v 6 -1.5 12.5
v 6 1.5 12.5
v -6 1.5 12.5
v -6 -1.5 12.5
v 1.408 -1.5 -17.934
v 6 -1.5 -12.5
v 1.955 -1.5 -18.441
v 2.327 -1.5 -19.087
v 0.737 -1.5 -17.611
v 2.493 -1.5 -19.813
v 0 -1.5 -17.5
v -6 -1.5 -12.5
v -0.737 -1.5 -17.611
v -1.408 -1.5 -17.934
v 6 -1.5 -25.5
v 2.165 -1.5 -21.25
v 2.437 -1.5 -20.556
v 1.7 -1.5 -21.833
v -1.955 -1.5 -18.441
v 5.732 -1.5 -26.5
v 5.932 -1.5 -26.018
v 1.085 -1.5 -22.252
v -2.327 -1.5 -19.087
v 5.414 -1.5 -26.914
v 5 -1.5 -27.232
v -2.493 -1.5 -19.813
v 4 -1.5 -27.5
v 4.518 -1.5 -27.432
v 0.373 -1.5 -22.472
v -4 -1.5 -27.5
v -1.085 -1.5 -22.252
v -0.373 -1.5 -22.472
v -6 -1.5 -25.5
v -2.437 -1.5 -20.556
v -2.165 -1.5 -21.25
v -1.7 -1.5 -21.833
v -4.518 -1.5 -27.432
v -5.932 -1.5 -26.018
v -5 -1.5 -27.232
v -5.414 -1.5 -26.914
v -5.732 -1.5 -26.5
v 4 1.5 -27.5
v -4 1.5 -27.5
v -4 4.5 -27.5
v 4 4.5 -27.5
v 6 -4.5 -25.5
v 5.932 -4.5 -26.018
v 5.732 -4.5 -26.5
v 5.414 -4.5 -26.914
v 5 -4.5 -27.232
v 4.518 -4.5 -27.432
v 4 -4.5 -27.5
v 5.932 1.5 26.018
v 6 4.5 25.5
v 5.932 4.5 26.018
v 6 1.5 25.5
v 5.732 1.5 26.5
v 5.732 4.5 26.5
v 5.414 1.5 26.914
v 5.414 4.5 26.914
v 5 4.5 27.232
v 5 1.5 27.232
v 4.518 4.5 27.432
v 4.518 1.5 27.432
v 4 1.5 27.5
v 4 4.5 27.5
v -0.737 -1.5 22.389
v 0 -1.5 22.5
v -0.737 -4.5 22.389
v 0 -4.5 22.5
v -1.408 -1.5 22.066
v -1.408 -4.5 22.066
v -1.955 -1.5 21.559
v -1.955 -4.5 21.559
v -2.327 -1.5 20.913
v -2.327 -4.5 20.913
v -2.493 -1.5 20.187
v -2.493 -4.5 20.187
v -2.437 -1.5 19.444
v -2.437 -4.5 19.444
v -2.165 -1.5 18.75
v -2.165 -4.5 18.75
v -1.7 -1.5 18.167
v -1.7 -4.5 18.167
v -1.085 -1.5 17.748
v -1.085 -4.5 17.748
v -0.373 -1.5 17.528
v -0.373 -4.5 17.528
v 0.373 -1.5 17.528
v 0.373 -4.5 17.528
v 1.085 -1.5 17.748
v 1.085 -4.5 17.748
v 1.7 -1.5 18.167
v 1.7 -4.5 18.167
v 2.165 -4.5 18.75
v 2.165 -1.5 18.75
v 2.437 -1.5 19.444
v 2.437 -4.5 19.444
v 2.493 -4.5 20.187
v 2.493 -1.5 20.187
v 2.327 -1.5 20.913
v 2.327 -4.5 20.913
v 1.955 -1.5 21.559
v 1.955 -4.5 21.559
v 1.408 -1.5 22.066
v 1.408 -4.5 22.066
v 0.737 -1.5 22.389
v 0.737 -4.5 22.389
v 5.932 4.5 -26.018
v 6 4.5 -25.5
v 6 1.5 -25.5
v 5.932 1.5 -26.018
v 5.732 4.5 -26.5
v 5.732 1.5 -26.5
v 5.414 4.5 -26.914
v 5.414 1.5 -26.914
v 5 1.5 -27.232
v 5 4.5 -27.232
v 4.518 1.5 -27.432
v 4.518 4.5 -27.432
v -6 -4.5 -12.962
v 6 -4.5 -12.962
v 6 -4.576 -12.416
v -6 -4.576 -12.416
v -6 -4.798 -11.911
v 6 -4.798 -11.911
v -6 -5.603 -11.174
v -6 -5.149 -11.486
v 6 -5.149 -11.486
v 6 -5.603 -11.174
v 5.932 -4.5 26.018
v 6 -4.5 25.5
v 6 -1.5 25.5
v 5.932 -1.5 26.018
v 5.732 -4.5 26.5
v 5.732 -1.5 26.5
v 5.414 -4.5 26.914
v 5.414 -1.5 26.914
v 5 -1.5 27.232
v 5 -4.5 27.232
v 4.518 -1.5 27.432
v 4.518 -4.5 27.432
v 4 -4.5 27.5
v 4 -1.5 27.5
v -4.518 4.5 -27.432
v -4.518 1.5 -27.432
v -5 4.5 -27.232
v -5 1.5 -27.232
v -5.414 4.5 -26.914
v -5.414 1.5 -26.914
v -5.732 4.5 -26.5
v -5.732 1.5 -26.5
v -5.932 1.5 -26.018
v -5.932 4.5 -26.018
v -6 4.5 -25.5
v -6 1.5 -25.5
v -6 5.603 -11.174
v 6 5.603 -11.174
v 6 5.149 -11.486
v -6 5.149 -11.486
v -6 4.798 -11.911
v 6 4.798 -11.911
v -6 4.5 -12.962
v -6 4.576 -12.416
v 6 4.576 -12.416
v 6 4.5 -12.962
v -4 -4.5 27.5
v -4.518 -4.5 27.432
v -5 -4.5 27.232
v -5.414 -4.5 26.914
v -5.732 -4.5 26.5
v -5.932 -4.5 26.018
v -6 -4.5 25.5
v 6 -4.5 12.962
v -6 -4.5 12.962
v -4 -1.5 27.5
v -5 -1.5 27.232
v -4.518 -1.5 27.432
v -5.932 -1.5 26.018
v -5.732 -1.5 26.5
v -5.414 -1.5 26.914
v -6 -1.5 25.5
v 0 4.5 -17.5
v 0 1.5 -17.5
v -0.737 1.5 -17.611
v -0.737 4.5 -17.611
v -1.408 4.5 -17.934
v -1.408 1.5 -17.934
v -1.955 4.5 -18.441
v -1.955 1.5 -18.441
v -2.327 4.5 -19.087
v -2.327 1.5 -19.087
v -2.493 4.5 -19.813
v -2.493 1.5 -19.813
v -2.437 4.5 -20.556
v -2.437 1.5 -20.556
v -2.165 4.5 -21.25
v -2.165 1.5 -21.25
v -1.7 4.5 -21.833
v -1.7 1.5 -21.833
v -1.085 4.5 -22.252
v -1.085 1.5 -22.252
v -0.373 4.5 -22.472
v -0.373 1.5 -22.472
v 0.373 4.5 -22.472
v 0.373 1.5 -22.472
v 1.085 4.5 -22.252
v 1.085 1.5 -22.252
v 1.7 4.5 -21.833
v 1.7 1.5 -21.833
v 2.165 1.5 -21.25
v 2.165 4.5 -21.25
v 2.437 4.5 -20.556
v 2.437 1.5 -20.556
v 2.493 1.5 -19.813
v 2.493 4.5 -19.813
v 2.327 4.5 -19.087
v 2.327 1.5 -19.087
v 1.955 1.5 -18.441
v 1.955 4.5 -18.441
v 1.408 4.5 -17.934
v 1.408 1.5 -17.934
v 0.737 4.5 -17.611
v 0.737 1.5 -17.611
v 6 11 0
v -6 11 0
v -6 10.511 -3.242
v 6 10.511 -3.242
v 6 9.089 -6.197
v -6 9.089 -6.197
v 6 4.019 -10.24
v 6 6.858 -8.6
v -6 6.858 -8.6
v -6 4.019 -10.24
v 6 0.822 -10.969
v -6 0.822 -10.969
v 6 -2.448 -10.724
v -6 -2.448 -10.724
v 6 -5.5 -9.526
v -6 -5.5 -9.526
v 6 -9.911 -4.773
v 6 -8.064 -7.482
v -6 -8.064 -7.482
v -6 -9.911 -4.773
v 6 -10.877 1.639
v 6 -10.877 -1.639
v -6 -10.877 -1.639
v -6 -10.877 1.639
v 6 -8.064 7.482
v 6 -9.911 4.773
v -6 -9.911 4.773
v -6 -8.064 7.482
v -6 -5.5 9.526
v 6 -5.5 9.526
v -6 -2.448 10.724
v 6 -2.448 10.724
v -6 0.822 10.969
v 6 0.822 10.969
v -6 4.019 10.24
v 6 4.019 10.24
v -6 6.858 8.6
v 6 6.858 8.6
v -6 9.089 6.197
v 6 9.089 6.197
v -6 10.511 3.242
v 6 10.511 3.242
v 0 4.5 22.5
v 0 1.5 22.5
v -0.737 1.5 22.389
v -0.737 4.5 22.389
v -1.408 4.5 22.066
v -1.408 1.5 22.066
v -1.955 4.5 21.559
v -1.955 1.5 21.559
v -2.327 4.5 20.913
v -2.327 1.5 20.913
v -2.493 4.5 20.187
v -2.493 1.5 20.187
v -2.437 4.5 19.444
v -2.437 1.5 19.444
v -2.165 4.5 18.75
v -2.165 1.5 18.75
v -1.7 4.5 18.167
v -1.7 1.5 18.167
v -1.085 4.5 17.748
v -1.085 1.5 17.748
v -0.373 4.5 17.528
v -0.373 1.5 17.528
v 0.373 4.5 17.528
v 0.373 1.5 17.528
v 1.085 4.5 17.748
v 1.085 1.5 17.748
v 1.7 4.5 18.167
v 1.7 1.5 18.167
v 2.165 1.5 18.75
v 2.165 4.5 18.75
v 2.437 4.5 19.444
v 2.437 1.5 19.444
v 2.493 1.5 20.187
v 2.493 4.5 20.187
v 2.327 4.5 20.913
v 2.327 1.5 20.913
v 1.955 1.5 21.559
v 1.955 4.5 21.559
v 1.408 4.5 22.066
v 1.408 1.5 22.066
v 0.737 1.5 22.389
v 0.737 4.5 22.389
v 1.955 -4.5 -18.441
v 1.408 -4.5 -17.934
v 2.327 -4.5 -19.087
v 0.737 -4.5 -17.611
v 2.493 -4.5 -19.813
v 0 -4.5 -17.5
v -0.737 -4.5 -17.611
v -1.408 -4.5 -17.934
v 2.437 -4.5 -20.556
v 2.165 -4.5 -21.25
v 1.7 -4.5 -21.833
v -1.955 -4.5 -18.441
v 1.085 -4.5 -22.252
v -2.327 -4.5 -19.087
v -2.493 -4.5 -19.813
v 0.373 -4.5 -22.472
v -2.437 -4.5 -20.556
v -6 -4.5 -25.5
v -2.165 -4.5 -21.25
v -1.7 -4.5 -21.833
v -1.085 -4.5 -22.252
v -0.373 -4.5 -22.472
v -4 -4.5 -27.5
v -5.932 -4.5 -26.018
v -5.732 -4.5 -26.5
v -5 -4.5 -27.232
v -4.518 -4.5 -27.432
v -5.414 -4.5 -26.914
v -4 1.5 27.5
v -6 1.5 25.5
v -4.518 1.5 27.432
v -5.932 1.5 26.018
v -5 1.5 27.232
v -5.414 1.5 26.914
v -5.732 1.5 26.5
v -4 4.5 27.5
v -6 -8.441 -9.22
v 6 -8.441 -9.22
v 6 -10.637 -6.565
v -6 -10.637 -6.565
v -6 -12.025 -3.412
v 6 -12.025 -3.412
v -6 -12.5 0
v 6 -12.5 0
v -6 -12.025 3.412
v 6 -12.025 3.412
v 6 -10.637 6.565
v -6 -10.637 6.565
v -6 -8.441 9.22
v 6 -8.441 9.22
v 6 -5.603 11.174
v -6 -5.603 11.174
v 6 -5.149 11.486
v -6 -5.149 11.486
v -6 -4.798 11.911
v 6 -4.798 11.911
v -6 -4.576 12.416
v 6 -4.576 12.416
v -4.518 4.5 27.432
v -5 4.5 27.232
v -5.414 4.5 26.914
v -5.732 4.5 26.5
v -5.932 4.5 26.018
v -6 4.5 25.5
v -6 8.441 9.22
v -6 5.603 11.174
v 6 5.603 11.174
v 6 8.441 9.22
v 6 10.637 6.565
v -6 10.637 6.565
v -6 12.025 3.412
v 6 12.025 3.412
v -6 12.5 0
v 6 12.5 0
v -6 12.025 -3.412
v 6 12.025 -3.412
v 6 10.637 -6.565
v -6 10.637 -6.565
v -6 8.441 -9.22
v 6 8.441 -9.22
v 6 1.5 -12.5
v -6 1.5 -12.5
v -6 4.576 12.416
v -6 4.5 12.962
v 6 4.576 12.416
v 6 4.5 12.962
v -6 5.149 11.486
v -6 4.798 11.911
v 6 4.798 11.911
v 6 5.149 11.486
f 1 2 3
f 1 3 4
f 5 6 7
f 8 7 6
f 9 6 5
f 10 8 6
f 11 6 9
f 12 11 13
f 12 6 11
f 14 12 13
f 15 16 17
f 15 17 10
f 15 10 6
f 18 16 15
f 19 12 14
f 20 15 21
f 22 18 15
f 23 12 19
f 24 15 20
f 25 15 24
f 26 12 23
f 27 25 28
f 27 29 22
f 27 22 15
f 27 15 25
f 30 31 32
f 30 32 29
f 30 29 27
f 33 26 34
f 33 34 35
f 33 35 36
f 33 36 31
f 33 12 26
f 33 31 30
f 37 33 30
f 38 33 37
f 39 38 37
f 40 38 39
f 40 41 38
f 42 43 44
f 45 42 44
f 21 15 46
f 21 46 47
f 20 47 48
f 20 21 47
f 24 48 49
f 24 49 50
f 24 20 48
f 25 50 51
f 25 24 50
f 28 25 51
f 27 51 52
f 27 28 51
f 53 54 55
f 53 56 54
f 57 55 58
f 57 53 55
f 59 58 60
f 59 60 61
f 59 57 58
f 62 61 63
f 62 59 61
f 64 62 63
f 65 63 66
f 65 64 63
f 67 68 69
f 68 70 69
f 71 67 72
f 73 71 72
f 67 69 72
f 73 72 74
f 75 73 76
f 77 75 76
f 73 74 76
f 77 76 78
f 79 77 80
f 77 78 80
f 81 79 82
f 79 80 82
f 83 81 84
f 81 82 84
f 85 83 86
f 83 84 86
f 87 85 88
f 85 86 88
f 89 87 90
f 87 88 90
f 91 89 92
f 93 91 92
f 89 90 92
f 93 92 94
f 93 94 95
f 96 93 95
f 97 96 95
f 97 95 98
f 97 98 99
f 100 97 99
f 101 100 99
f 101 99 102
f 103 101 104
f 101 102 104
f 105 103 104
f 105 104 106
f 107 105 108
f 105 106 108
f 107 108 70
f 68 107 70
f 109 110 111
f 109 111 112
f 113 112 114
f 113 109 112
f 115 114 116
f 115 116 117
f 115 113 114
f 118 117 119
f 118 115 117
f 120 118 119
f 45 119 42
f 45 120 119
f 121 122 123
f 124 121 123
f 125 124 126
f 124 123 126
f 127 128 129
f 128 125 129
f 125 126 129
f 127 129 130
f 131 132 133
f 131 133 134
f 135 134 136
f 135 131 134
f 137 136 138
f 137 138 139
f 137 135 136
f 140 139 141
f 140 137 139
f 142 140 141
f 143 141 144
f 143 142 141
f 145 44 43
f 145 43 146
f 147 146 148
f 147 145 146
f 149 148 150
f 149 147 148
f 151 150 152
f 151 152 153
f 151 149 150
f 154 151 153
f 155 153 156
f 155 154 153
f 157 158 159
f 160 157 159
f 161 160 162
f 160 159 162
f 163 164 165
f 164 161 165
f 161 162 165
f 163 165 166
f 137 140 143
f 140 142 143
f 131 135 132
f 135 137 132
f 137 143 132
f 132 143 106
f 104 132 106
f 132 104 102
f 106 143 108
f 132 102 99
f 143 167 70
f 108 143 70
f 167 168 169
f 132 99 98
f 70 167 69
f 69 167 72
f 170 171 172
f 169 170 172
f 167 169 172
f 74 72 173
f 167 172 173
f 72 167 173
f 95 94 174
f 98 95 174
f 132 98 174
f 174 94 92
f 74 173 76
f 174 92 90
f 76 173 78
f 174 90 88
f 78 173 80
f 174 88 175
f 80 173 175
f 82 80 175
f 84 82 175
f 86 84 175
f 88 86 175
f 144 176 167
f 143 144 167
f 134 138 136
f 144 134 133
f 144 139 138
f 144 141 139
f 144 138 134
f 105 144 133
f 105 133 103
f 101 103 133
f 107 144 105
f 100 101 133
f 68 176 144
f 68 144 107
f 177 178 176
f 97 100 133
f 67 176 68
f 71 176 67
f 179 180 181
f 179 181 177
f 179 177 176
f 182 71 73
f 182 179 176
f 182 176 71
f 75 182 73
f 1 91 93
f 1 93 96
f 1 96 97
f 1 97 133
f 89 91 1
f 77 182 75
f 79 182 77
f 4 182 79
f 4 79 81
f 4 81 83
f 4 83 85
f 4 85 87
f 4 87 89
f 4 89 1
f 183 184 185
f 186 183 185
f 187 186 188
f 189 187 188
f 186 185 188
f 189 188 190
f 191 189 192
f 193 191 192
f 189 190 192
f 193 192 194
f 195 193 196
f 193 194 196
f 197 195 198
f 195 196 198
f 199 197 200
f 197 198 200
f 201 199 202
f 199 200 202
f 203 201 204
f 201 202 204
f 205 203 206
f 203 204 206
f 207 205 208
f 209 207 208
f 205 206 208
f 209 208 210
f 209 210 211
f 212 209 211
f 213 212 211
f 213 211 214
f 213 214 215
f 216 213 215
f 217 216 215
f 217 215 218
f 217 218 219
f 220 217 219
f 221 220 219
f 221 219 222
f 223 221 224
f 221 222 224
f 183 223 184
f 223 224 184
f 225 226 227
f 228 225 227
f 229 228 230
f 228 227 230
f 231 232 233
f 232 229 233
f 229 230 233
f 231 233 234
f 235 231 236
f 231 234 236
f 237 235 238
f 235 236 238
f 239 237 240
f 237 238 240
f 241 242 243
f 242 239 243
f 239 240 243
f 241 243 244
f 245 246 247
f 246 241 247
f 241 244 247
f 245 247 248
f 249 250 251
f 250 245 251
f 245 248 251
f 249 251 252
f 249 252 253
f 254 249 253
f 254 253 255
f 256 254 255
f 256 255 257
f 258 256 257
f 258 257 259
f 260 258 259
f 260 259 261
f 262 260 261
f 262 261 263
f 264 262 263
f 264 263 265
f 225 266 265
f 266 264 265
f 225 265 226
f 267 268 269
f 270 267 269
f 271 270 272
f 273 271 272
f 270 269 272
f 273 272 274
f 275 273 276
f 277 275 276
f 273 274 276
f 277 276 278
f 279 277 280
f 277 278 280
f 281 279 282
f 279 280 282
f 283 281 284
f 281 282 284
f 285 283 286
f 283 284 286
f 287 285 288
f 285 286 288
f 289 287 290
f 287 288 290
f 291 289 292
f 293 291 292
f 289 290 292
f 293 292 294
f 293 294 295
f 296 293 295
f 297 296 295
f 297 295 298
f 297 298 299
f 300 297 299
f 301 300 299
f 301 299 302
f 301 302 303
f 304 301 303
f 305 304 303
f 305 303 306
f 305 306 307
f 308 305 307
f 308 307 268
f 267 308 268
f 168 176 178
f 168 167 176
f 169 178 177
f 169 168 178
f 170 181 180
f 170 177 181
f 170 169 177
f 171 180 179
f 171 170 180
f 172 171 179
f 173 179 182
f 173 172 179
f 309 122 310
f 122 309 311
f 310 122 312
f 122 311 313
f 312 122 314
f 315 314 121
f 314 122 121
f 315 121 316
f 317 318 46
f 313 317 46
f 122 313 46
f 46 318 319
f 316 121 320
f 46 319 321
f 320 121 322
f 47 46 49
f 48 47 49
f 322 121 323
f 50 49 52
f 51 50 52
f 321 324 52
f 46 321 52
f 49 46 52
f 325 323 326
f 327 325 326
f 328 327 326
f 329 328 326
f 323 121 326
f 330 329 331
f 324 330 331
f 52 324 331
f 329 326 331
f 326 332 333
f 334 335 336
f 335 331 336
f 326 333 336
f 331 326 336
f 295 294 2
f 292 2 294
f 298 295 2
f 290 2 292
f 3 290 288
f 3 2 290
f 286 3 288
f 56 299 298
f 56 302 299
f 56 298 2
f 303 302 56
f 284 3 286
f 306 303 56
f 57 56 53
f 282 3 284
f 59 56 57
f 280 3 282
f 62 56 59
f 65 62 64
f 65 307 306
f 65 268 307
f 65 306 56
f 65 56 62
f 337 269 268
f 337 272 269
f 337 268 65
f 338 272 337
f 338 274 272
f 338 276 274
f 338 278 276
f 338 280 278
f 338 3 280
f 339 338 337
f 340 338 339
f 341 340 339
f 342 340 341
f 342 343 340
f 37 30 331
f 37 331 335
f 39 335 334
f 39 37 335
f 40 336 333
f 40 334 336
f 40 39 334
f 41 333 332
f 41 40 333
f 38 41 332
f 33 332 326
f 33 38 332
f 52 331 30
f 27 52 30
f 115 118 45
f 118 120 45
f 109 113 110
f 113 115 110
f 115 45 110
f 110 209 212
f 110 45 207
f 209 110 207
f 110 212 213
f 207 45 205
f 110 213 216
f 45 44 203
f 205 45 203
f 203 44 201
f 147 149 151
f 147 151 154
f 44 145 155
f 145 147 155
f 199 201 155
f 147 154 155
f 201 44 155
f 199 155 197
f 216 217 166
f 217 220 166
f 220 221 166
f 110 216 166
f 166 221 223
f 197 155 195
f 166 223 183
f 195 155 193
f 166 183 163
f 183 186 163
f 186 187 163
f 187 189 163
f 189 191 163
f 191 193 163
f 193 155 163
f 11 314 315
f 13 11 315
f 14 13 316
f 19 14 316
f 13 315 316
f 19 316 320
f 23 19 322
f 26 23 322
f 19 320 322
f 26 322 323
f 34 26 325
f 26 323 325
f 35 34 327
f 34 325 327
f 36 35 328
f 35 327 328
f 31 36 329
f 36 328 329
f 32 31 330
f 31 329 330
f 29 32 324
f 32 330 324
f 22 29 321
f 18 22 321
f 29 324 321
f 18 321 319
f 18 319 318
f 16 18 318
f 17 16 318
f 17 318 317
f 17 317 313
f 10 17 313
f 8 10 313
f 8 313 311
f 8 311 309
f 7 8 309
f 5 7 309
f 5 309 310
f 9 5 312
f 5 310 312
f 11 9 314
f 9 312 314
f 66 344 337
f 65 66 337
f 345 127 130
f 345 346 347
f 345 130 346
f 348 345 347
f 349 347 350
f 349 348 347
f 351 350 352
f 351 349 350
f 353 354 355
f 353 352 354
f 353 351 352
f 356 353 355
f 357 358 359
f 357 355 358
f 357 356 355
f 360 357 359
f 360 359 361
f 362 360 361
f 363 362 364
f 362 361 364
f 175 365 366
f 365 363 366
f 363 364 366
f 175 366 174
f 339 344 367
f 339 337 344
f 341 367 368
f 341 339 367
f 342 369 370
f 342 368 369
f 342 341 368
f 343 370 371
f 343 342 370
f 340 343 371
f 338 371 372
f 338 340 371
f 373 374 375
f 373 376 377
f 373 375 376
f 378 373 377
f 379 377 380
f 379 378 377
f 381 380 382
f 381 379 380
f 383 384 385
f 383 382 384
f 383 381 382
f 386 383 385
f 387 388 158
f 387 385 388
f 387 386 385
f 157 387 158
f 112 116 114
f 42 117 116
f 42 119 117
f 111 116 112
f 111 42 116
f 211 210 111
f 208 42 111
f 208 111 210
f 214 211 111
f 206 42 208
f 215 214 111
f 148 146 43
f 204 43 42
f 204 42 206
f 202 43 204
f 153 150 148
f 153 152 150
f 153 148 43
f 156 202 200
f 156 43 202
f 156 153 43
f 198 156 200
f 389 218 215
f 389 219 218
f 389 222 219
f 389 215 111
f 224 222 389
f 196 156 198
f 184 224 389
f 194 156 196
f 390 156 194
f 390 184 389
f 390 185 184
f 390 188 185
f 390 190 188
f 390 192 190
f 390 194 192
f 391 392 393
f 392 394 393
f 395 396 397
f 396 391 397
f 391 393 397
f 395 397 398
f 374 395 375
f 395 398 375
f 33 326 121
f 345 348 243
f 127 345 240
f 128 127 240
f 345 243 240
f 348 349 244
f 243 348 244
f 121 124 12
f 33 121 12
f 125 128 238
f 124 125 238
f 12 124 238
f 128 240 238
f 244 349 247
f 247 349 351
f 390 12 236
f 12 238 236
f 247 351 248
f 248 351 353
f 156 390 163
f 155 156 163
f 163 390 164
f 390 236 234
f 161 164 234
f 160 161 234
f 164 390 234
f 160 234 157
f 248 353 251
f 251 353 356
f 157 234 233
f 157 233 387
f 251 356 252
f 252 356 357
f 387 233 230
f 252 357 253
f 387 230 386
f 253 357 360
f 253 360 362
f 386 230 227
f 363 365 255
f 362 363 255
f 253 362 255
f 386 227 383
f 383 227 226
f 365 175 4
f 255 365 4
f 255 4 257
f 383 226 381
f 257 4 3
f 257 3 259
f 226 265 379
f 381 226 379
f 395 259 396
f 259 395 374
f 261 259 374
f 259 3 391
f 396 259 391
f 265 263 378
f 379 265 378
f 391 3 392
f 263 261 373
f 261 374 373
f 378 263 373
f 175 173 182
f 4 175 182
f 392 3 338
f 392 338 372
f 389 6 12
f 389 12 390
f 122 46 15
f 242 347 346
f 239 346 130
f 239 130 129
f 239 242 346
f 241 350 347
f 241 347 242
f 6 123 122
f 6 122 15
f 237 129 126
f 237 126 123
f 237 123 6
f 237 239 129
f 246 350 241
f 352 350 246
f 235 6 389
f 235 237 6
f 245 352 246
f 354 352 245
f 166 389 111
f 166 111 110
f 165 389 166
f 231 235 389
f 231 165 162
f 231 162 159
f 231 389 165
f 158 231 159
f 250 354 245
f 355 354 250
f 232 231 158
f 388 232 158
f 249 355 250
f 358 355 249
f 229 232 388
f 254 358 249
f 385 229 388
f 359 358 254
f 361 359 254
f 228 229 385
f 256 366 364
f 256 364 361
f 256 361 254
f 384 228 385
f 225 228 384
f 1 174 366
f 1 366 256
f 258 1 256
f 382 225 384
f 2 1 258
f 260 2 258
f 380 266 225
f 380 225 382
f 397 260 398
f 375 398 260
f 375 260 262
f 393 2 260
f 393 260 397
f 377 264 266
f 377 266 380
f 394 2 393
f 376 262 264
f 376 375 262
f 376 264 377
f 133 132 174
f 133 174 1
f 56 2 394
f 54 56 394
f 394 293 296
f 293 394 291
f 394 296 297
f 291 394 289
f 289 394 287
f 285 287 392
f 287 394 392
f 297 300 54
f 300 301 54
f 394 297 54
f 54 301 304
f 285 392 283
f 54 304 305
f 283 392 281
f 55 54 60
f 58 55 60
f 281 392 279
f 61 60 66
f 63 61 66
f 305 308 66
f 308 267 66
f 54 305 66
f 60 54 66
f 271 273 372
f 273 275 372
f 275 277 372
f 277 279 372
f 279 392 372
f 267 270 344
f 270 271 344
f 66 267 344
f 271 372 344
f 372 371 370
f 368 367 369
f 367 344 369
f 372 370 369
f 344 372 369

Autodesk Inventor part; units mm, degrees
ref_plane "YZ Plane" through (0, 0, 0) normal (1, 0, 0) x (0, 1, 0)
ref_plane "XZ Plane" through (0, 0, 0) normal (0, 1, 0) x (-1, 0, 0)
ref_plane "XY Plane" through (0, 0, 0) normal (0, 0, 1) x (1, 0, 0)
sketch "Esboço1" plane through (0, 0, 0) normal (1, 0, 0) x (0, 1, 0)
  circle A0 centre (0, 0) radius 11
  line L0 (1.5, -27.5) -> (1.5, -12.4097)
  line L1 (1.5, 12.4097) -> (1.5, 27.5)
  line L2 (4.5, -27.5) -> (4.5, -11.6619)
  line L3 (4.5, 11.6619) -> (4.5, 27.5)
  line L4 (-4.5, 27.5) -> (-4.5, 11.6619)
  line L5 (-4.5, -11.6619) -> (-4.5, -27.5)
  line L6 (-1.5, 27.5) -> (-1.5, 12.4097)
  line L7 (-1.5, -12.4097) -> (-1.5, -27.5)
  line L8 (-4.5, -27.5) -> (-1.5, -27.5)
  line L9 (1.5, -27.5) -> (4.5, -27.5)
  line L10 (4.5, 27.5) -> (1.5, 27.5)
  line L11 (-1.5, 27.5) -> (-4.5, 27.5)
  line L12 (0, -12.5) -> (1.5, -12.5)
  line L13 (0, -12.5) -> (-1.5, -12.5)
  line L14 (0, 12.5) -> (1.5, 12.5)
  line L15 (0, 12.5) -> (-1.5, 12.5)
  arc A1 (-1.5, 12.4097) -> (-1.5, -12.4097) centre (0, 0) ccw
  arc A2 (1.5, -12.4097) -> (1.5, 12.4097) centre (0, 0) ccw
  dimension "d0" = 22
extrude "Extrusão1" add sketch "Esboço1" along normal mid plane 12
sketch "Esboço2" plane through (-6, 4.5, 27.5) normal (0, 1, 0) x (1, 0, 0)
  point P0 (6, 27.5)
sketch "Esboço3" plane through (-6, -1.5, 27.5) normal (0, 1, 0) x (1, 0, 0)
  circle A0 centre (6, 7.5) radius 2.5
  line L0 (0, 0) -> (12, 0) projected
  line L1 (12, 15) -> (12, 0) projected
  line L2 (0, 0) -> (0, 15.8381) projected
  point P0 (6, 27.5)
  dimension "d17" = 5
  dimension "d18" = 7.5
  dimension "d19" = 6
hole "Furo1" at (0, -1.5, 20) direction (0, -1, 0) diameter 5 end through all both
sketch "Esboço4" plane through (-6, -1.5, -12.5) normal (0, 1, 0) x (1, 0, 0)
  circle A0 centre (6, 7.5) radius 2.5
  line L0 (12, 15) -> (0, 15) projected
  line L1 (12, 15) -> (12, -0.8381) projected
  point P0 (6, -12.5)
  dimension "d28" = 5
  dimension "d29" = 7.5
  dimension "d30" = 6
hole "Furo2" at (0, -1.5, -20) direction (0, -1, 0) diameter 5 end through all both
fillet "Arredondamento1" radius 2 12 edges at (0, 4.5, 11.6619) (0, 4.5, -11.6619) (0, -4.5, -11.6619) (0, -4.5, 11.6619) (6, 3, 27.5) (-6, 3, 27.5) (-6, -3, 27.5) (6, -3, 27.5) (6, 3, -27.5) (6, -3, -27.5) (-6, -3, -27.5) (-6, 3, -27.5)
properties part number "Abraçadeira_CPY1_CPY_CPY1" material "ABS plástico"
